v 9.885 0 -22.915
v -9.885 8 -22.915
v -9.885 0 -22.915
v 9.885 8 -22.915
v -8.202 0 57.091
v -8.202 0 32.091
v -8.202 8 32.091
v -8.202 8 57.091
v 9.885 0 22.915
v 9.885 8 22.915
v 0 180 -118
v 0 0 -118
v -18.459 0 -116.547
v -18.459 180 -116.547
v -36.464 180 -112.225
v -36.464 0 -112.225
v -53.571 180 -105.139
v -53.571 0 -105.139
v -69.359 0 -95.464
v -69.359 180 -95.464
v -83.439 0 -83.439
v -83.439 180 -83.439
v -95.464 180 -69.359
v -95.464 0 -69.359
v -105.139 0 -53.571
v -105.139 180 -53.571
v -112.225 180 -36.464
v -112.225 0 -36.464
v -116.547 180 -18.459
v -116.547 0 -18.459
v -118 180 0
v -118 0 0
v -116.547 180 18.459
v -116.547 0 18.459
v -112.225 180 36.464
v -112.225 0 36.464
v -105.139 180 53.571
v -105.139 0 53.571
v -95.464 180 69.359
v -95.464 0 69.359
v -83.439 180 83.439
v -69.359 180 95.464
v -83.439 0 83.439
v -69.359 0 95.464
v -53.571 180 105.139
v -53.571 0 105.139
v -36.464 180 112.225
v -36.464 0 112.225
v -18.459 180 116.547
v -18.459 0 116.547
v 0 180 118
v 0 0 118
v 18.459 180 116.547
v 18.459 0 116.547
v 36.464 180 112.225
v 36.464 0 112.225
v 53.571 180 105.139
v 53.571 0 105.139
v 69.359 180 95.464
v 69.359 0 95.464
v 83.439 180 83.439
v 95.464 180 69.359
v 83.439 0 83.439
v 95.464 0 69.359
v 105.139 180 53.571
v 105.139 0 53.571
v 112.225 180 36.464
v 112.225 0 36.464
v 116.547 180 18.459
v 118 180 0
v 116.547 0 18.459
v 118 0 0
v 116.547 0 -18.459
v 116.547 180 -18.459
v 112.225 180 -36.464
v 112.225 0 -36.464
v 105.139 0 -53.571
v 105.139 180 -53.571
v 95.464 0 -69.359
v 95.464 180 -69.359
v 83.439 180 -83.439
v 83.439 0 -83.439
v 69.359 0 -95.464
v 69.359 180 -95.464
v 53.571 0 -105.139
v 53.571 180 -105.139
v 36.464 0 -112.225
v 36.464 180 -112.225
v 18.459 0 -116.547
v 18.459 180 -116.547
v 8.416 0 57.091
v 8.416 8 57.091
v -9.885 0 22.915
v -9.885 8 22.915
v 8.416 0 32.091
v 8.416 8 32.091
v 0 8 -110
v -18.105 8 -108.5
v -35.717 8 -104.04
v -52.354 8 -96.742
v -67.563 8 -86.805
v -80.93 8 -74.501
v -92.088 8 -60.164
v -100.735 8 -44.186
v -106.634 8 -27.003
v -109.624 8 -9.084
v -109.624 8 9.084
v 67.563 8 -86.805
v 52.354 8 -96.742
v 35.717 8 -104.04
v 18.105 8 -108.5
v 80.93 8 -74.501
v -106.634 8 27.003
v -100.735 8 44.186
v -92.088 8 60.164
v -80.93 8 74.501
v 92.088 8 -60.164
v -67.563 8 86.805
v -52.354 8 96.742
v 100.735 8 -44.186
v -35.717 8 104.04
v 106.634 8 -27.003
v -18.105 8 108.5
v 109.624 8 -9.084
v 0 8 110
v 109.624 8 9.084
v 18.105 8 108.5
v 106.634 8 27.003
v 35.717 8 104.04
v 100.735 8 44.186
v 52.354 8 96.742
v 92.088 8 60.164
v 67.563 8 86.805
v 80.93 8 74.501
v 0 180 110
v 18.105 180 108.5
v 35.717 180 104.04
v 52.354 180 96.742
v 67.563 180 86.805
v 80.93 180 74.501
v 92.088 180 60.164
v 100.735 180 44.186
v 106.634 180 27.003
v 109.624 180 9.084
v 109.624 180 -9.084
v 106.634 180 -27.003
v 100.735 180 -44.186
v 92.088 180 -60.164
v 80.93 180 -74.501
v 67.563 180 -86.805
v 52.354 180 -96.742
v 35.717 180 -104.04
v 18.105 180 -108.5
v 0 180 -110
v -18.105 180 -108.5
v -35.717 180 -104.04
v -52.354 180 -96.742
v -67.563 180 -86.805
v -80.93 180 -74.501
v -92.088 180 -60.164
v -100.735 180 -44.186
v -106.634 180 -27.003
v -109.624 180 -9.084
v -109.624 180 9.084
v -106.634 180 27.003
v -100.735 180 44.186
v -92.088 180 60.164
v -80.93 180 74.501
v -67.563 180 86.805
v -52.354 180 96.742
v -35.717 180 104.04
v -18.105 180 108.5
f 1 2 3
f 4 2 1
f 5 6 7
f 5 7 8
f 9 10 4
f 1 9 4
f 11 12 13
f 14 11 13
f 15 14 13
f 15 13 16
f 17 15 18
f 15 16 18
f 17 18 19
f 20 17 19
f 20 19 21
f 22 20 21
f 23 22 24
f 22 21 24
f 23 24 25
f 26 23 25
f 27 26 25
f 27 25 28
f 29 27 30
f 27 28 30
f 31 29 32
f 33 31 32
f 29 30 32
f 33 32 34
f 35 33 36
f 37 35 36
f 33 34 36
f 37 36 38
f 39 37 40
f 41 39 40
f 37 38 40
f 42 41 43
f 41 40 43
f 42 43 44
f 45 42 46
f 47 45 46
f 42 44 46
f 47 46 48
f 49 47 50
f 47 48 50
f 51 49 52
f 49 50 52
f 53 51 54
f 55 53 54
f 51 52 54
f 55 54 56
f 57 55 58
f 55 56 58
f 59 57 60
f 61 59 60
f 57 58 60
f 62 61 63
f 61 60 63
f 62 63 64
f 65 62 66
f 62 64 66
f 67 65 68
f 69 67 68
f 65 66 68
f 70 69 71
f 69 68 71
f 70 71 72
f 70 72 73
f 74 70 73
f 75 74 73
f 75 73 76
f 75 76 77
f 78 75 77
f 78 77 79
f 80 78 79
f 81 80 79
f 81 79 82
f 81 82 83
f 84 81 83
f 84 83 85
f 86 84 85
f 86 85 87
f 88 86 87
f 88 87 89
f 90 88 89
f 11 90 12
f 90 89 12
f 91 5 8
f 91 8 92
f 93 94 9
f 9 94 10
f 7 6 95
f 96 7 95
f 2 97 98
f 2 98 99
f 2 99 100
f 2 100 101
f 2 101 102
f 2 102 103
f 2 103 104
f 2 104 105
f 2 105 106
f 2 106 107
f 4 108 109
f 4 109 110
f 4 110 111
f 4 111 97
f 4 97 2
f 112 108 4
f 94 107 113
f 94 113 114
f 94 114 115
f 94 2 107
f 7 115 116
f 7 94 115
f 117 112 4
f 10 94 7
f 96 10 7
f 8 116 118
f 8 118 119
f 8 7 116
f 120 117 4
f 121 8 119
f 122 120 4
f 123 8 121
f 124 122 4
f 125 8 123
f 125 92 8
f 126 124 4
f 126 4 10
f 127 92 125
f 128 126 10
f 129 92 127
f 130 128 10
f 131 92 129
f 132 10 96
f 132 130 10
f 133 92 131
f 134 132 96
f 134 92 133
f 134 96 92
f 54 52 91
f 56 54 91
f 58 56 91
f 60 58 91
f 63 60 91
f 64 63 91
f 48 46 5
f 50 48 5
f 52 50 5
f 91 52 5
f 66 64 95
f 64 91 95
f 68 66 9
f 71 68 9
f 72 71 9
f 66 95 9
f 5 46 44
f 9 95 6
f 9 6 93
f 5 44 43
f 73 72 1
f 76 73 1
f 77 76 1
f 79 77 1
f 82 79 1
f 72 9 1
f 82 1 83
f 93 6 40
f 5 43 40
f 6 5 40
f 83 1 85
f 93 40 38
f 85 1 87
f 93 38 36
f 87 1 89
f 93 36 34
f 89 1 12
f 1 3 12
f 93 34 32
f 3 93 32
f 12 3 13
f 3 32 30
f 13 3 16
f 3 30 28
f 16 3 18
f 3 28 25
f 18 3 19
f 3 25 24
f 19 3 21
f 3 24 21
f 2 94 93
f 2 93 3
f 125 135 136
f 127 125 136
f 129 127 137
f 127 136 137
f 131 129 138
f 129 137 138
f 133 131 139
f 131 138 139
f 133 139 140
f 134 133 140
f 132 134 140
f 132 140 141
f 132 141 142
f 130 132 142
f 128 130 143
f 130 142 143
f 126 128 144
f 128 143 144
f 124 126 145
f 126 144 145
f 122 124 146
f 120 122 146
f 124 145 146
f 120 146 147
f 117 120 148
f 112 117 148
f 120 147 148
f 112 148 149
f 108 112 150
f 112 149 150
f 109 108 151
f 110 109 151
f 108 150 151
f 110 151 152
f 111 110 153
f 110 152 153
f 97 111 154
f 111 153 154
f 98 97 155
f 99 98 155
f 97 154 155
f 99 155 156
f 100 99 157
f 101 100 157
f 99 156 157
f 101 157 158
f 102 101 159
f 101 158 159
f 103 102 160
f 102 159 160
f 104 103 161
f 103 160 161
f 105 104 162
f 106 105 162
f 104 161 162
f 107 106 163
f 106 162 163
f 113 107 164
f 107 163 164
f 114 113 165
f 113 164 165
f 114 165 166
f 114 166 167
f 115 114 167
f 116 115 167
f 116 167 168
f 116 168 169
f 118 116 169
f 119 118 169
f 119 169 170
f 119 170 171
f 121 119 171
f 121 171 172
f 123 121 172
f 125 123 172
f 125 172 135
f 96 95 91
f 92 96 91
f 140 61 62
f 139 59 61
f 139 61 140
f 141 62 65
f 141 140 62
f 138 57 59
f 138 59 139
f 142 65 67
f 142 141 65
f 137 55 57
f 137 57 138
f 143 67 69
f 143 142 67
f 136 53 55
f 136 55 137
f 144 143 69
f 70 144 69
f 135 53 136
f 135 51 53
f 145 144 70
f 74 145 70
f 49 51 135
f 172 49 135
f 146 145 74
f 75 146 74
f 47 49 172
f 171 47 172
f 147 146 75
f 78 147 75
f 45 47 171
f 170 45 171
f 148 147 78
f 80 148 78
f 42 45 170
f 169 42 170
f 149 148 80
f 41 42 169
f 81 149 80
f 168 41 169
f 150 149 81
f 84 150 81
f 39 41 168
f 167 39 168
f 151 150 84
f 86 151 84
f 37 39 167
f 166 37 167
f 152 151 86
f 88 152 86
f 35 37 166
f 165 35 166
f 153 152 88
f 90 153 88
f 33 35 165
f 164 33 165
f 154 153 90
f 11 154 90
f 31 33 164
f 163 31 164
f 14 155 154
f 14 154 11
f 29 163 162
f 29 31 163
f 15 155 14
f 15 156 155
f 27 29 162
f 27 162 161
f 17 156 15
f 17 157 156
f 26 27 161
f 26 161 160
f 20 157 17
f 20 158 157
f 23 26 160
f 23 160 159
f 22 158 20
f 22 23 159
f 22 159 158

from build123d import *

# Parameters (mm, degrees)
SKETCH1_R           = 118
BOSS_EXTRUDE1_DEPTH = 180
SKETCH3_R           = 110
CUT_EXTRUDE1_DEPTH  = 172
SKETCH6_W           = 19.77
SKETCH6_H           = 45.83
CUT_EXTRUDE2_DEPTH  = 240.649744419
SKETCH7_W           = 16.617647061
SKETCH7_H           = 25
CUT_EXTRUDE3_DEPTH  = 158


with BuildPart() as part:
    # Sketch1 → Boss-Extrude1 (new body)
    with BuildSketch(Plane(origin=(0, 0, 0), x_dir=(1, 0, 0), z_dir=(0, 1, 0))):
        with Locations(Location((0, 0, 0), (0, 0, 90))):
            Circle(SKETCH1_R)
    extrude(amount=BOSS_EXTRUDE1_DEPTH)

    # Sketch3 → Cut-Extrude1 (cut)
    with BuildSketch(Plane(origin=(0, 180, 0), x_dir=(1, 0, 0), z_dir=(0, 1, 0))):
        with Locations(Location((0, 0, 0), (0, 0, 270))):
            Circle(SKETCH3_R)
    extrude(amount=-CUT_EXTRUDE1_DEPTH, mode=Mode.SUBTRACT)

    # Sketch6 → Cut-Extrude2 (cut, through all)
    with BuildSketch(Plane(origin=(0, 8, 0), x_dir=(1, 0, 0), z_dir=(0, 1, 0))):
        Rectangle(SKETCH6_W, SKETCH6_H)
    extrude(amount=-CUT_EXTRUDE2_DEPTH, mode=Mode.SUBTRACT)

    # Sketch7 → Cut-Extrude3 (cut)
    with BuildSketch(Plane.XZ):
        with Locations((0.107153446, 44.591409708)):
            Rectangle(SKETCH7_W, SKETCH7_H)
    extrude(amount=-CUT_EXTRUDE3_DEPTH, mode=Mode.SUBTRACT)


solid = part.part
